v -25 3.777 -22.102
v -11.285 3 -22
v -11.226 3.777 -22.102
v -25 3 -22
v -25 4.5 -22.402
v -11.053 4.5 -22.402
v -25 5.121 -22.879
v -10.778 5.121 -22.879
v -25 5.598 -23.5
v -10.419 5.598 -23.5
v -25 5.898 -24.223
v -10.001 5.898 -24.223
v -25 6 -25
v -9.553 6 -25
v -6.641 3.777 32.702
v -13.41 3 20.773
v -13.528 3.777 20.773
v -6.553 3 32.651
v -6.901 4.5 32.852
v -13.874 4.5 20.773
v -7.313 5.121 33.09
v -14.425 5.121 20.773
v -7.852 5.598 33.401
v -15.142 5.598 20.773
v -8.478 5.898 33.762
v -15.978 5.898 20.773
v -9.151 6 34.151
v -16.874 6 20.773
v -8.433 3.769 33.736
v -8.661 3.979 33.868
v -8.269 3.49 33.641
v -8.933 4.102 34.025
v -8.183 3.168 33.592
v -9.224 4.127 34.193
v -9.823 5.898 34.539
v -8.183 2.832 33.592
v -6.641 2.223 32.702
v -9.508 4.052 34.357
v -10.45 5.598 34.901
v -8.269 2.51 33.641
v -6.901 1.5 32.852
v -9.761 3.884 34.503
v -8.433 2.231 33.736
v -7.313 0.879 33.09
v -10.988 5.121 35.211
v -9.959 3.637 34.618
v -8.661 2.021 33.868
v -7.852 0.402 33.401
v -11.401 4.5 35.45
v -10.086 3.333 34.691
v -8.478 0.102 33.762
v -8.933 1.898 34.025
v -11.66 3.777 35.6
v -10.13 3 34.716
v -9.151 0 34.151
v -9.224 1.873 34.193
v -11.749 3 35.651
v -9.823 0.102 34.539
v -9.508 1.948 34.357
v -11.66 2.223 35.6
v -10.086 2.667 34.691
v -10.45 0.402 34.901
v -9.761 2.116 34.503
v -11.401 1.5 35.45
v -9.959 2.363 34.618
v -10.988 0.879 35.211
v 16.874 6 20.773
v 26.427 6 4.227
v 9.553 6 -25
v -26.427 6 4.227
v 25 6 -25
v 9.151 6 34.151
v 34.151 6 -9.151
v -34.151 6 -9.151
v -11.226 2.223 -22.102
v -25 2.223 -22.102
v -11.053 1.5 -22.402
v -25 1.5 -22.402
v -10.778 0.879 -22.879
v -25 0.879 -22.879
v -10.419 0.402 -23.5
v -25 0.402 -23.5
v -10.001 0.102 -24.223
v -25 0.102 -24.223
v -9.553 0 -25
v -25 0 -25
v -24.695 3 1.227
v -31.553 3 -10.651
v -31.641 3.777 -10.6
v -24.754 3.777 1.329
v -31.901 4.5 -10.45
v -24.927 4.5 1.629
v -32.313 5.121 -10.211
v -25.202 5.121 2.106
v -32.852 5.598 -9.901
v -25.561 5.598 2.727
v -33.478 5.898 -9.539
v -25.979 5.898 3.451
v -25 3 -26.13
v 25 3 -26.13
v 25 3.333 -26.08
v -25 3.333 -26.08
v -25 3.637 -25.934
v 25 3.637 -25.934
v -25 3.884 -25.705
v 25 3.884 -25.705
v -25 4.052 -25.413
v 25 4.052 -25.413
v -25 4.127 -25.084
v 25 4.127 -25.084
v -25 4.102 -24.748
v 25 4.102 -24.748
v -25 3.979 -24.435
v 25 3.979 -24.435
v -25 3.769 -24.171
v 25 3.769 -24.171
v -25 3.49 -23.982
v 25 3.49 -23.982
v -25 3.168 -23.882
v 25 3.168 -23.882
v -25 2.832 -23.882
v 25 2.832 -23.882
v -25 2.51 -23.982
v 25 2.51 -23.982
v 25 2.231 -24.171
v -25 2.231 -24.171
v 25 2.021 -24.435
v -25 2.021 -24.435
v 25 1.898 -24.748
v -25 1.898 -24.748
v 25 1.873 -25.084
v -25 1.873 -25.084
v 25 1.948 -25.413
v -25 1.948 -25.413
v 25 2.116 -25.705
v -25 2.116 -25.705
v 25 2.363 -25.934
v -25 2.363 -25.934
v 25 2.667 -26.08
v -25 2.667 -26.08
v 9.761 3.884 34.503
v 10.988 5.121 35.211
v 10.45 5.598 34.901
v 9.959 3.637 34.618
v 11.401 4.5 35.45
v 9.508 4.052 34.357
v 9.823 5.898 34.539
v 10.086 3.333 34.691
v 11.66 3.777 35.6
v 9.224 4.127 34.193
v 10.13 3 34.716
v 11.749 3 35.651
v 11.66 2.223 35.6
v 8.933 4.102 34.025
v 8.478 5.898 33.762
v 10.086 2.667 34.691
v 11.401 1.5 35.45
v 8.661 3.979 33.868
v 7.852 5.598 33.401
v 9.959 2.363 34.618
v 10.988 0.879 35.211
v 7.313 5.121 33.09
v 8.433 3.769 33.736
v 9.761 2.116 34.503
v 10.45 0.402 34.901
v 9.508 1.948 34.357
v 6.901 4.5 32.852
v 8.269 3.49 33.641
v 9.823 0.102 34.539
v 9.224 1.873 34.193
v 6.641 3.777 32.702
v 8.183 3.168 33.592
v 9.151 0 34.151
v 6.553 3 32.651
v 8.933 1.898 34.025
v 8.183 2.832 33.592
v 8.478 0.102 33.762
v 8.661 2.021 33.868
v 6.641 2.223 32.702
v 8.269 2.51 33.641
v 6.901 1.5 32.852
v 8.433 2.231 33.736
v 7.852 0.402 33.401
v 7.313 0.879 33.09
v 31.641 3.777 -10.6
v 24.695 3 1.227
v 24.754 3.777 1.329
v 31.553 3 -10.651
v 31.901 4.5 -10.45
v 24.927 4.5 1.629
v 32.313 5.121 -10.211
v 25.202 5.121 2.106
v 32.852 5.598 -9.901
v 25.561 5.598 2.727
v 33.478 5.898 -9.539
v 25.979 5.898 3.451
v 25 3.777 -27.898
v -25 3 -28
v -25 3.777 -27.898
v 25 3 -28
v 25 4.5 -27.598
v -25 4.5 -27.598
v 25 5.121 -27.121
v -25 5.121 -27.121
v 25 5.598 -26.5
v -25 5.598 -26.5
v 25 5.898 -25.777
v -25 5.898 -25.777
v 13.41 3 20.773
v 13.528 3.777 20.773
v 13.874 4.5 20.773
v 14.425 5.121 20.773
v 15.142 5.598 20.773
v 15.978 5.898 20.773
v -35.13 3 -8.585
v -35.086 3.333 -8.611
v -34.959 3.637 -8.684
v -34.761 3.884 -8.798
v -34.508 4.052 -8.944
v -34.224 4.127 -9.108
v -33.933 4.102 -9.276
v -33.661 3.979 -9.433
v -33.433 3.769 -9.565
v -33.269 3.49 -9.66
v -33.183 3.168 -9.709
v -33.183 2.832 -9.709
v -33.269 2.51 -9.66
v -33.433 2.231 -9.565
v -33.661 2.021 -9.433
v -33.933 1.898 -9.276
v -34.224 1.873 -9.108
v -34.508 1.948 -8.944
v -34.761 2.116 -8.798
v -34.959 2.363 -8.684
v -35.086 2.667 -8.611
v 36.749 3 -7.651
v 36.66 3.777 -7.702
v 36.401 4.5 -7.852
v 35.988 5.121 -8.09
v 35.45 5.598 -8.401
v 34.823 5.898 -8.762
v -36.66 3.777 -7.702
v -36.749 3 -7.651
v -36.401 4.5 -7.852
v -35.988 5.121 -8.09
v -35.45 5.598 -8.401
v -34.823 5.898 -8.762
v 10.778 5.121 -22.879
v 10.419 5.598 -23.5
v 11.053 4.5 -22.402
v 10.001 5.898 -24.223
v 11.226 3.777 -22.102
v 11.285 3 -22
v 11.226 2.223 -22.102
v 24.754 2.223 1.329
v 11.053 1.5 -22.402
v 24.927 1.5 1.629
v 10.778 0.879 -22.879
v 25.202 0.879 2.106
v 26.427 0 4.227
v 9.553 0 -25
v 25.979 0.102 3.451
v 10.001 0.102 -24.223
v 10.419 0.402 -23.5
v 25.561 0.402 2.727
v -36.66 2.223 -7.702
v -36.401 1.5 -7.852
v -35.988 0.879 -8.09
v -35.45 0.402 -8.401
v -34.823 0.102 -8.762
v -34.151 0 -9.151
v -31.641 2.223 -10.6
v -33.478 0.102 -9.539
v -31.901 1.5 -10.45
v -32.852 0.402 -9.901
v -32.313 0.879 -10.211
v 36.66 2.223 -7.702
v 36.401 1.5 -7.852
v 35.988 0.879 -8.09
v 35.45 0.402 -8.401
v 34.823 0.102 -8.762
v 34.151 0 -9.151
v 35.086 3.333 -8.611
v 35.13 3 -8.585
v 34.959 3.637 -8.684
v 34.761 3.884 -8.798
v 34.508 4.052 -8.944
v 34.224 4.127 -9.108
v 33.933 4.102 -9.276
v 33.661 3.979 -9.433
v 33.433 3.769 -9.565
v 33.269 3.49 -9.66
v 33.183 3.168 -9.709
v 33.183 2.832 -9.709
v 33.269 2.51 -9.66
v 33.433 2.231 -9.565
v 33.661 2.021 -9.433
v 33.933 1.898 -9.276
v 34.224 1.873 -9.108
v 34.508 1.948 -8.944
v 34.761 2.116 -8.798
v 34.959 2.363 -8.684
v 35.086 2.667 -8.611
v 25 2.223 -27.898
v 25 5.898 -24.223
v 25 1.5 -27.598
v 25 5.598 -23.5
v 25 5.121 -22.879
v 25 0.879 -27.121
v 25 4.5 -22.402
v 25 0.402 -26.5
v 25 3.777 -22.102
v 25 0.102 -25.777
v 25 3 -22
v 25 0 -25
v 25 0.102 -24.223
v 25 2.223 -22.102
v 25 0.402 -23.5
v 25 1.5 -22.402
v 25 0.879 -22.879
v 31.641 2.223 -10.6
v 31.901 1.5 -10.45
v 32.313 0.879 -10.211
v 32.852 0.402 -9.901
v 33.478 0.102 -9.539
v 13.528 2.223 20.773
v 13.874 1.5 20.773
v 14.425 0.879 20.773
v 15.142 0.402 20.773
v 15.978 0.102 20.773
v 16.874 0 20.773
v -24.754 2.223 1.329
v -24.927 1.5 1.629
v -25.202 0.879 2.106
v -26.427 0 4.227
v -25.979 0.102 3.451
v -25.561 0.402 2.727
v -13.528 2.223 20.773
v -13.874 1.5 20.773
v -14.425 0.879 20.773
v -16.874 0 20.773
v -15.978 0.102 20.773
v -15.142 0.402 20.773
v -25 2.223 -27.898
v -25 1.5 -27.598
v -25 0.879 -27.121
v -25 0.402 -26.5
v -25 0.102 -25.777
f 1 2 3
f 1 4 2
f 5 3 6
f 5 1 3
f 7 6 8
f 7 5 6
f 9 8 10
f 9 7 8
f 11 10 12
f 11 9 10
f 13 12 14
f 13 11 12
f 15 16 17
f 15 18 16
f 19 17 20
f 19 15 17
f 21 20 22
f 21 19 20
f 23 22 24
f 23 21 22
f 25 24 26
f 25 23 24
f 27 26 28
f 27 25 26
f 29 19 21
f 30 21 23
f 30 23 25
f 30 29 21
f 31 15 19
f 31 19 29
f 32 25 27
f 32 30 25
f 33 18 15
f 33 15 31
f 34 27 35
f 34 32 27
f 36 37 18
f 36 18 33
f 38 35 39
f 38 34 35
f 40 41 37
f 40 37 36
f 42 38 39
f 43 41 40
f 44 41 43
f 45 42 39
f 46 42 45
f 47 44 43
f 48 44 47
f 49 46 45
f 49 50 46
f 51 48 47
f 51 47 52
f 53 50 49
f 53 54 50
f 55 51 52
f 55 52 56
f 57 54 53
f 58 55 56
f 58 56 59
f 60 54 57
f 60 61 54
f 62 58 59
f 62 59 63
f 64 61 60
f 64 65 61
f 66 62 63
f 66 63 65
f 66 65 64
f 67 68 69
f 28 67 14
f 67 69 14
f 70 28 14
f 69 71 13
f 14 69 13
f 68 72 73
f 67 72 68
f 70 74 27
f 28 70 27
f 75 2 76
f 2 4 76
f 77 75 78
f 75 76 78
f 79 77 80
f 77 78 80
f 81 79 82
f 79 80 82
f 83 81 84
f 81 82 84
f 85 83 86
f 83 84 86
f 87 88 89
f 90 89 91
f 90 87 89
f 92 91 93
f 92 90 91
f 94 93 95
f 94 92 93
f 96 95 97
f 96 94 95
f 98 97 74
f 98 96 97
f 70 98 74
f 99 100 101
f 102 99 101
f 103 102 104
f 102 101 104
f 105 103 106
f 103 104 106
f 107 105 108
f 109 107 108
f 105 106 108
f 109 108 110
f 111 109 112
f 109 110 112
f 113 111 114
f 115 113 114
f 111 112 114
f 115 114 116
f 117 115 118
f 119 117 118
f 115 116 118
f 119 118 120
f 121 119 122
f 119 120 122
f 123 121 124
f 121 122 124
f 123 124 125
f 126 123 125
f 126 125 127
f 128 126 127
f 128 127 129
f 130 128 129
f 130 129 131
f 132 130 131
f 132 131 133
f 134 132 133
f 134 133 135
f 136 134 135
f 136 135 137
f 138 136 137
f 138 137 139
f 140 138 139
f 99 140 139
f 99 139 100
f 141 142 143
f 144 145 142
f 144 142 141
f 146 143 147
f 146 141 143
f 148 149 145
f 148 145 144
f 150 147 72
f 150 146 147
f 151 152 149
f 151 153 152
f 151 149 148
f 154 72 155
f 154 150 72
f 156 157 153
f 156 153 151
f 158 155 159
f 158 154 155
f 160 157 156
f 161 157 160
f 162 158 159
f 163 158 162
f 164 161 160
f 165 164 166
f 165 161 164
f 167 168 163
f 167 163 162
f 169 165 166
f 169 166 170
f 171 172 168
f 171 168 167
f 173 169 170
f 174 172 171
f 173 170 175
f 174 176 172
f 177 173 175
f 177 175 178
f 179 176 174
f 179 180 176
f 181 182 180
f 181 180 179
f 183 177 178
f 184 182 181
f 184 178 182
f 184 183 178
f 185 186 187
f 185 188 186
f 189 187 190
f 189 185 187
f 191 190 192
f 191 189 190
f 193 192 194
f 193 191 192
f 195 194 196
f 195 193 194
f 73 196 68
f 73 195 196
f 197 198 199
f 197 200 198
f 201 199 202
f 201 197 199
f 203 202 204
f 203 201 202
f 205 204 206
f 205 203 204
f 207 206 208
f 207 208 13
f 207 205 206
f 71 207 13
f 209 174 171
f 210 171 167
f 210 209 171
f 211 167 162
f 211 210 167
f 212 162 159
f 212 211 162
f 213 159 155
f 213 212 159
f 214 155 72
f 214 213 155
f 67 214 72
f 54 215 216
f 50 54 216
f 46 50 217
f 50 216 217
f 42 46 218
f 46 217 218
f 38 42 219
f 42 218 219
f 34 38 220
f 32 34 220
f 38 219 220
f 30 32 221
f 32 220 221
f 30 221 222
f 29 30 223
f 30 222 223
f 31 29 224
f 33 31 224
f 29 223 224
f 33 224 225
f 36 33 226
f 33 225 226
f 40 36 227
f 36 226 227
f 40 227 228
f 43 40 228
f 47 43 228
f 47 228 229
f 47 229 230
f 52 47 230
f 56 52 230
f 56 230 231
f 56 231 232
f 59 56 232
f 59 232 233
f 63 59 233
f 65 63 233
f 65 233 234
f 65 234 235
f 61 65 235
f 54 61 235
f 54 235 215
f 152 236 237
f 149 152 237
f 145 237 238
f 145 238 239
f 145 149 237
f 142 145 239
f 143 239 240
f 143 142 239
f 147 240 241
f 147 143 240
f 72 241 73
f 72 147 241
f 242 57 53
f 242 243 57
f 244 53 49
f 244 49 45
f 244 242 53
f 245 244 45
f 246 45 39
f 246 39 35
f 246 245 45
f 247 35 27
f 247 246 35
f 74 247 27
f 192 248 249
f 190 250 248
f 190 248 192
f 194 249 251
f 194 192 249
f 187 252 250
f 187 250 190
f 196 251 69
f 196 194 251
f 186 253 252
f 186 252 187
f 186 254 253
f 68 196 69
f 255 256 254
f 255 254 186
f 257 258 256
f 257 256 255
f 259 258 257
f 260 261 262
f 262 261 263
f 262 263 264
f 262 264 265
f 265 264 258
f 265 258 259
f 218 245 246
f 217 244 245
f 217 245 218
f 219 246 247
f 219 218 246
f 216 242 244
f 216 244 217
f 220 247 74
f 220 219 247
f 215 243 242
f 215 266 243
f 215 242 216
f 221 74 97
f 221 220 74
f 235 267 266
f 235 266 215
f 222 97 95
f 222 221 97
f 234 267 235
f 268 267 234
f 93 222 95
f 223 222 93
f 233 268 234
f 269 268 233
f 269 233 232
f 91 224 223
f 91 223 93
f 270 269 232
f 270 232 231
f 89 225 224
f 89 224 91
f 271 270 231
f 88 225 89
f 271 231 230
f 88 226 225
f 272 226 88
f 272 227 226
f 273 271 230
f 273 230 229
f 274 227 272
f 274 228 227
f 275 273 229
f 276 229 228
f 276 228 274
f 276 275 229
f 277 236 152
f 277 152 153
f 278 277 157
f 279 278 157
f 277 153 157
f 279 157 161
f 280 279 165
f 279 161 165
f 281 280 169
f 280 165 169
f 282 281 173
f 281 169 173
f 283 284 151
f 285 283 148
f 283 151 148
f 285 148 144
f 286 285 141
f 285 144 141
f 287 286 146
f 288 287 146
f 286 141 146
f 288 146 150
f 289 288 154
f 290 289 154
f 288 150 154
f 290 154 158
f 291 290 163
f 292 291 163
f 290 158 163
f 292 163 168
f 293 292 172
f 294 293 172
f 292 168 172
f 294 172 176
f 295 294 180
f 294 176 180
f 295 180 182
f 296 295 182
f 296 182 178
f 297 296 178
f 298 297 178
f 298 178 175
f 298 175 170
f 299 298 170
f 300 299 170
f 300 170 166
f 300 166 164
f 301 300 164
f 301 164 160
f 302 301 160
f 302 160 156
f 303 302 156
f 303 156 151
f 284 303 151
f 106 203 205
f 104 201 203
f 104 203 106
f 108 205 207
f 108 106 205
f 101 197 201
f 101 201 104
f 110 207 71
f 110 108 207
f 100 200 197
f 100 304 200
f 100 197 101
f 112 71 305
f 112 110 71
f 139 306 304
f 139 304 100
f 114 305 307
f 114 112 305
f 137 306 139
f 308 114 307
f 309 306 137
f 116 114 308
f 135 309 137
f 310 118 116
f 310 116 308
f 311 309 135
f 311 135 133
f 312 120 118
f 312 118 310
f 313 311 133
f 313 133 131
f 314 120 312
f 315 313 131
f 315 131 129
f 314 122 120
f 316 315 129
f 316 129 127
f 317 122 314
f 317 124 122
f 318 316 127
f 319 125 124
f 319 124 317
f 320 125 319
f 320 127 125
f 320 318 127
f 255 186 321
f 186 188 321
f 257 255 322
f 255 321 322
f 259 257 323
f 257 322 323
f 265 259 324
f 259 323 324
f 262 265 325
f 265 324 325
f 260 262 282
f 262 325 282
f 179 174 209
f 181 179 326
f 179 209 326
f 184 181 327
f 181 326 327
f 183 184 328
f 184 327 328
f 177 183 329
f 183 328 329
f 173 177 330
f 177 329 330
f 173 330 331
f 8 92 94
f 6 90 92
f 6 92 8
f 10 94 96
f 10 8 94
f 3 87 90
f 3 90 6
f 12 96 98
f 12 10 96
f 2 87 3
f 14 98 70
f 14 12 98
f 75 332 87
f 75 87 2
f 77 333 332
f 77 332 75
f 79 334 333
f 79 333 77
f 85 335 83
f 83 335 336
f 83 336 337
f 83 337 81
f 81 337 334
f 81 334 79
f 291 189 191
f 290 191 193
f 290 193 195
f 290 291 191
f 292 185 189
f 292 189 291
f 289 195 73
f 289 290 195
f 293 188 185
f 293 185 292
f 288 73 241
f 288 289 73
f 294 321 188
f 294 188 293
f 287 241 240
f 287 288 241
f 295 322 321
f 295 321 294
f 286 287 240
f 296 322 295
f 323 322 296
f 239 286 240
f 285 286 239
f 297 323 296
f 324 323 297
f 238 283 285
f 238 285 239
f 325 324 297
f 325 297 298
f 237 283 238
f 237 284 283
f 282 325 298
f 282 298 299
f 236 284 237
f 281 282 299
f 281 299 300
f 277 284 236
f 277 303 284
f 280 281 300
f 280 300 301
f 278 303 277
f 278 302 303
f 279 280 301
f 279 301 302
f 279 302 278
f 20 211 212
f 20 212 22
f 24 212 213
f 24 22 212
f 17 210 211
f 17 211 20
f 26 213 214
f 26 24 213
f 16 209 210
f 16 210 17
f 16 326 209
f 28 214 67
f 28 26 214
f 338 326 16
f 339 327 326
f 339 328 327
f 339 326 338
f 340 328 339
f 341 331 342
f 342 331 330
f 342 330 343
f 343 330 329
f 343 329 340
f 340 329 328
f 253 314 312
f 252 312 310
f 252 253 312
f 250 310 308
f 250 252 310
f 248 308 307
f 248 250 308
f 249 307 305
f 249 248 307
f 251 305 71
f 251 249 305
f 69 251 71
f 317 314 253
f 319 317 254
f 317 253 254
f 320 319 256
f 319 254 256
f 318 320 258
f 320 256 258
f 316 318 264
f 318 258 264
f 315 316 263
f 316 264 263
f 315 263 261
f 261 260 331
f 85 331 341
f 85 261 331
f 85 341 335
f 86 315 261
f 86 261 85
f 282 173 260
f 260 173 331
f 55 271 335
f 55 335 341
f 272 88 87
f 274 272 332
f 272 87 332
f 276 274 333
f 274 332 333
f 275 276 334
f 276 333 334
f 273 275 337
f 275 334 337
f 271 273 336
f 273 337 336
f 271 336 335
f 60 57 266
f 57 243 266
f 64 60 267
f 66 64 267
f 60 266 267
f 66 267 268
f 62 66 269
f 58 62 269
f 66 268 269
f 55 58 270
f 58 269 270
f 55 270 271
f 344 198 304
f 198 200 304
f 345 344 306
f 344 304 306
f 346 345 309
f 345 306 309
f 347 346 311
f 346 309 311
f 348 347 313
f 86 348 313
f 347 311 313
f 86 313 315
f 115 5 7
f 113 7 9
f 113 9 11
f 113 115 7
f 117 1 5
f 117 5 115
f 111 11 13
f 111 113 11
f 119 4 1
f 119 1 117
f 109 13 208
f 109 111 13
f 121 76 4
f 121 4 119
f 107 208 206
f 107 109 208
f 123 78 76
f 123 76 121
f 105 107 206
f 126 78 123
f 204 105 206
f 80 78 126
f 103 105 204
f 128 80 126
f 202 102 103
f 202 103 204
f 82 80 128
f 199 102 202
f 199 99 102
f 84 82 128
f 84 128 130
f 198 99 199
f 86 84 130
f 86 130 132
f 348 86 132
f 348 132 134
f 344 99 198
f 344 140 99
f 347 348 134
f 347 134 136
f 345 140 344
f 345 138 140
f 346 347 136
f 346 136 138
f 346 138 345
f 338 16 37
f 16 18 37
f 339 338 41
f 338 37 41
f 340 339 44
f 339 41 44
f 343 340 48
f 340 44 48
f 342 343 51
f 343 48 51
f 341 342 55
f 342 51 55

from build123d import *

# Parameters (mm, degrees)
BOSS_EXTRUDE1_DEPTH   = 6
FILLET3_R             = 3
F_4_40_TAPPED_HOLE1_D = 2.2606
F_4_40_TAPPED_HOLE2_D = 2.2606
F_4_40_TAPPED_HOLE3_D = 2.2606


with BuildPart() as part:
    # Sketch1 → Boss-Extrude1 (new body)
    with BuildSketch(Plane(origin=(0, 0, 0), x_dir=(1, 0, 0), z_dir=(0, 1, 0))):
        Polygon((-24.694969511, -1.227058116), (-11.284821255, 22), (-25, 22), (-25, 28), (25, 28), (25, 22), (11.284821255, 22), (24.694969511, -1.227058116), (31.552558883, 10.650635095), (36.748711306, 7.650635095), (11.748711306, -35.650635095), (6.552558883, -32.650635095), (13.410148256, -20.772941884), (-13.410148256, -20.772941884), (-6.552558883, -32.650635095), (-11.748711306, -35.650635095), (-36.748711306, 7.650635095), (-31.552558883, 10.650635095), align=None)
    extrude(amount=BOSS_EXTRUDE1_DEPTH)

    # Fillet3
    fillet3_edges = [part.edges().sort_by_distance(p)[0] for p in [
        (24.248711306, 0, 14),
        (24.248711306, 6, 14),
        (0, 0, -28),
        (0, 6, -28),
        (-24.248711306, 0, 14),
        (-24.248711306, 6, 14),
        (9.981353569, 0, 26.711788489),
        (9.981353569, 6, 26.711788489),
        (28.123764197, 0, -4.711788489),
        (28.123764197, 6, -4.711788489),
        (18.142410628, 0, -22),
        (18.142410628, 6, -22),
        (-18.142410628, 6, -22),
        (-18.142410628, 0, -22),
        (-28.123764197, 6, -4.711788489),
        (-28.123764197, 0, -4.711788489),
        (-9.981353569, 0, 26.711788489),
        (-9.981353569, 6, 26.711788489),
    ]]
    fillet(fillet3_edges, radius=FILLET3_R - 0.0001)  # a hair under: the kernel refuses the full size

    # #4-40 Tapped Hole1 (through all)
    with Locations(Plane(origin=(12.5, 0, 21.650635095), x_dir=(0.866025403784438, 0, -0.5000000000000012), z_dir=(0.5000000000000012, 0, 0.866025403784438))):
        with Locations((-25, 3)):
            Hole(F_4_40_TAPPED_HOLE1_D / 2)

    # #4-40 Tapped Hole2 (through all)
    with Locations(Plane(origin=(12.5, 0, -21.650635095), x_dir=(-0.8660254037844389, 0, -0.4999999999999995), z_dir=(0.4999999999999995, 0, -0.8660254037844389))):
        with Locations((-25, 3)):
            Hole(F_4_40_TAPPED_HOLE2_D / 2)

    # #4-40 Tapped Hole3 (through all)
    with Locations(Plane.ZY.offset(25)):
        with Locations((-25, 3)):
            Hole(F_4_40_TAPPED_HOLE3_D / 2)


solid = part.part
